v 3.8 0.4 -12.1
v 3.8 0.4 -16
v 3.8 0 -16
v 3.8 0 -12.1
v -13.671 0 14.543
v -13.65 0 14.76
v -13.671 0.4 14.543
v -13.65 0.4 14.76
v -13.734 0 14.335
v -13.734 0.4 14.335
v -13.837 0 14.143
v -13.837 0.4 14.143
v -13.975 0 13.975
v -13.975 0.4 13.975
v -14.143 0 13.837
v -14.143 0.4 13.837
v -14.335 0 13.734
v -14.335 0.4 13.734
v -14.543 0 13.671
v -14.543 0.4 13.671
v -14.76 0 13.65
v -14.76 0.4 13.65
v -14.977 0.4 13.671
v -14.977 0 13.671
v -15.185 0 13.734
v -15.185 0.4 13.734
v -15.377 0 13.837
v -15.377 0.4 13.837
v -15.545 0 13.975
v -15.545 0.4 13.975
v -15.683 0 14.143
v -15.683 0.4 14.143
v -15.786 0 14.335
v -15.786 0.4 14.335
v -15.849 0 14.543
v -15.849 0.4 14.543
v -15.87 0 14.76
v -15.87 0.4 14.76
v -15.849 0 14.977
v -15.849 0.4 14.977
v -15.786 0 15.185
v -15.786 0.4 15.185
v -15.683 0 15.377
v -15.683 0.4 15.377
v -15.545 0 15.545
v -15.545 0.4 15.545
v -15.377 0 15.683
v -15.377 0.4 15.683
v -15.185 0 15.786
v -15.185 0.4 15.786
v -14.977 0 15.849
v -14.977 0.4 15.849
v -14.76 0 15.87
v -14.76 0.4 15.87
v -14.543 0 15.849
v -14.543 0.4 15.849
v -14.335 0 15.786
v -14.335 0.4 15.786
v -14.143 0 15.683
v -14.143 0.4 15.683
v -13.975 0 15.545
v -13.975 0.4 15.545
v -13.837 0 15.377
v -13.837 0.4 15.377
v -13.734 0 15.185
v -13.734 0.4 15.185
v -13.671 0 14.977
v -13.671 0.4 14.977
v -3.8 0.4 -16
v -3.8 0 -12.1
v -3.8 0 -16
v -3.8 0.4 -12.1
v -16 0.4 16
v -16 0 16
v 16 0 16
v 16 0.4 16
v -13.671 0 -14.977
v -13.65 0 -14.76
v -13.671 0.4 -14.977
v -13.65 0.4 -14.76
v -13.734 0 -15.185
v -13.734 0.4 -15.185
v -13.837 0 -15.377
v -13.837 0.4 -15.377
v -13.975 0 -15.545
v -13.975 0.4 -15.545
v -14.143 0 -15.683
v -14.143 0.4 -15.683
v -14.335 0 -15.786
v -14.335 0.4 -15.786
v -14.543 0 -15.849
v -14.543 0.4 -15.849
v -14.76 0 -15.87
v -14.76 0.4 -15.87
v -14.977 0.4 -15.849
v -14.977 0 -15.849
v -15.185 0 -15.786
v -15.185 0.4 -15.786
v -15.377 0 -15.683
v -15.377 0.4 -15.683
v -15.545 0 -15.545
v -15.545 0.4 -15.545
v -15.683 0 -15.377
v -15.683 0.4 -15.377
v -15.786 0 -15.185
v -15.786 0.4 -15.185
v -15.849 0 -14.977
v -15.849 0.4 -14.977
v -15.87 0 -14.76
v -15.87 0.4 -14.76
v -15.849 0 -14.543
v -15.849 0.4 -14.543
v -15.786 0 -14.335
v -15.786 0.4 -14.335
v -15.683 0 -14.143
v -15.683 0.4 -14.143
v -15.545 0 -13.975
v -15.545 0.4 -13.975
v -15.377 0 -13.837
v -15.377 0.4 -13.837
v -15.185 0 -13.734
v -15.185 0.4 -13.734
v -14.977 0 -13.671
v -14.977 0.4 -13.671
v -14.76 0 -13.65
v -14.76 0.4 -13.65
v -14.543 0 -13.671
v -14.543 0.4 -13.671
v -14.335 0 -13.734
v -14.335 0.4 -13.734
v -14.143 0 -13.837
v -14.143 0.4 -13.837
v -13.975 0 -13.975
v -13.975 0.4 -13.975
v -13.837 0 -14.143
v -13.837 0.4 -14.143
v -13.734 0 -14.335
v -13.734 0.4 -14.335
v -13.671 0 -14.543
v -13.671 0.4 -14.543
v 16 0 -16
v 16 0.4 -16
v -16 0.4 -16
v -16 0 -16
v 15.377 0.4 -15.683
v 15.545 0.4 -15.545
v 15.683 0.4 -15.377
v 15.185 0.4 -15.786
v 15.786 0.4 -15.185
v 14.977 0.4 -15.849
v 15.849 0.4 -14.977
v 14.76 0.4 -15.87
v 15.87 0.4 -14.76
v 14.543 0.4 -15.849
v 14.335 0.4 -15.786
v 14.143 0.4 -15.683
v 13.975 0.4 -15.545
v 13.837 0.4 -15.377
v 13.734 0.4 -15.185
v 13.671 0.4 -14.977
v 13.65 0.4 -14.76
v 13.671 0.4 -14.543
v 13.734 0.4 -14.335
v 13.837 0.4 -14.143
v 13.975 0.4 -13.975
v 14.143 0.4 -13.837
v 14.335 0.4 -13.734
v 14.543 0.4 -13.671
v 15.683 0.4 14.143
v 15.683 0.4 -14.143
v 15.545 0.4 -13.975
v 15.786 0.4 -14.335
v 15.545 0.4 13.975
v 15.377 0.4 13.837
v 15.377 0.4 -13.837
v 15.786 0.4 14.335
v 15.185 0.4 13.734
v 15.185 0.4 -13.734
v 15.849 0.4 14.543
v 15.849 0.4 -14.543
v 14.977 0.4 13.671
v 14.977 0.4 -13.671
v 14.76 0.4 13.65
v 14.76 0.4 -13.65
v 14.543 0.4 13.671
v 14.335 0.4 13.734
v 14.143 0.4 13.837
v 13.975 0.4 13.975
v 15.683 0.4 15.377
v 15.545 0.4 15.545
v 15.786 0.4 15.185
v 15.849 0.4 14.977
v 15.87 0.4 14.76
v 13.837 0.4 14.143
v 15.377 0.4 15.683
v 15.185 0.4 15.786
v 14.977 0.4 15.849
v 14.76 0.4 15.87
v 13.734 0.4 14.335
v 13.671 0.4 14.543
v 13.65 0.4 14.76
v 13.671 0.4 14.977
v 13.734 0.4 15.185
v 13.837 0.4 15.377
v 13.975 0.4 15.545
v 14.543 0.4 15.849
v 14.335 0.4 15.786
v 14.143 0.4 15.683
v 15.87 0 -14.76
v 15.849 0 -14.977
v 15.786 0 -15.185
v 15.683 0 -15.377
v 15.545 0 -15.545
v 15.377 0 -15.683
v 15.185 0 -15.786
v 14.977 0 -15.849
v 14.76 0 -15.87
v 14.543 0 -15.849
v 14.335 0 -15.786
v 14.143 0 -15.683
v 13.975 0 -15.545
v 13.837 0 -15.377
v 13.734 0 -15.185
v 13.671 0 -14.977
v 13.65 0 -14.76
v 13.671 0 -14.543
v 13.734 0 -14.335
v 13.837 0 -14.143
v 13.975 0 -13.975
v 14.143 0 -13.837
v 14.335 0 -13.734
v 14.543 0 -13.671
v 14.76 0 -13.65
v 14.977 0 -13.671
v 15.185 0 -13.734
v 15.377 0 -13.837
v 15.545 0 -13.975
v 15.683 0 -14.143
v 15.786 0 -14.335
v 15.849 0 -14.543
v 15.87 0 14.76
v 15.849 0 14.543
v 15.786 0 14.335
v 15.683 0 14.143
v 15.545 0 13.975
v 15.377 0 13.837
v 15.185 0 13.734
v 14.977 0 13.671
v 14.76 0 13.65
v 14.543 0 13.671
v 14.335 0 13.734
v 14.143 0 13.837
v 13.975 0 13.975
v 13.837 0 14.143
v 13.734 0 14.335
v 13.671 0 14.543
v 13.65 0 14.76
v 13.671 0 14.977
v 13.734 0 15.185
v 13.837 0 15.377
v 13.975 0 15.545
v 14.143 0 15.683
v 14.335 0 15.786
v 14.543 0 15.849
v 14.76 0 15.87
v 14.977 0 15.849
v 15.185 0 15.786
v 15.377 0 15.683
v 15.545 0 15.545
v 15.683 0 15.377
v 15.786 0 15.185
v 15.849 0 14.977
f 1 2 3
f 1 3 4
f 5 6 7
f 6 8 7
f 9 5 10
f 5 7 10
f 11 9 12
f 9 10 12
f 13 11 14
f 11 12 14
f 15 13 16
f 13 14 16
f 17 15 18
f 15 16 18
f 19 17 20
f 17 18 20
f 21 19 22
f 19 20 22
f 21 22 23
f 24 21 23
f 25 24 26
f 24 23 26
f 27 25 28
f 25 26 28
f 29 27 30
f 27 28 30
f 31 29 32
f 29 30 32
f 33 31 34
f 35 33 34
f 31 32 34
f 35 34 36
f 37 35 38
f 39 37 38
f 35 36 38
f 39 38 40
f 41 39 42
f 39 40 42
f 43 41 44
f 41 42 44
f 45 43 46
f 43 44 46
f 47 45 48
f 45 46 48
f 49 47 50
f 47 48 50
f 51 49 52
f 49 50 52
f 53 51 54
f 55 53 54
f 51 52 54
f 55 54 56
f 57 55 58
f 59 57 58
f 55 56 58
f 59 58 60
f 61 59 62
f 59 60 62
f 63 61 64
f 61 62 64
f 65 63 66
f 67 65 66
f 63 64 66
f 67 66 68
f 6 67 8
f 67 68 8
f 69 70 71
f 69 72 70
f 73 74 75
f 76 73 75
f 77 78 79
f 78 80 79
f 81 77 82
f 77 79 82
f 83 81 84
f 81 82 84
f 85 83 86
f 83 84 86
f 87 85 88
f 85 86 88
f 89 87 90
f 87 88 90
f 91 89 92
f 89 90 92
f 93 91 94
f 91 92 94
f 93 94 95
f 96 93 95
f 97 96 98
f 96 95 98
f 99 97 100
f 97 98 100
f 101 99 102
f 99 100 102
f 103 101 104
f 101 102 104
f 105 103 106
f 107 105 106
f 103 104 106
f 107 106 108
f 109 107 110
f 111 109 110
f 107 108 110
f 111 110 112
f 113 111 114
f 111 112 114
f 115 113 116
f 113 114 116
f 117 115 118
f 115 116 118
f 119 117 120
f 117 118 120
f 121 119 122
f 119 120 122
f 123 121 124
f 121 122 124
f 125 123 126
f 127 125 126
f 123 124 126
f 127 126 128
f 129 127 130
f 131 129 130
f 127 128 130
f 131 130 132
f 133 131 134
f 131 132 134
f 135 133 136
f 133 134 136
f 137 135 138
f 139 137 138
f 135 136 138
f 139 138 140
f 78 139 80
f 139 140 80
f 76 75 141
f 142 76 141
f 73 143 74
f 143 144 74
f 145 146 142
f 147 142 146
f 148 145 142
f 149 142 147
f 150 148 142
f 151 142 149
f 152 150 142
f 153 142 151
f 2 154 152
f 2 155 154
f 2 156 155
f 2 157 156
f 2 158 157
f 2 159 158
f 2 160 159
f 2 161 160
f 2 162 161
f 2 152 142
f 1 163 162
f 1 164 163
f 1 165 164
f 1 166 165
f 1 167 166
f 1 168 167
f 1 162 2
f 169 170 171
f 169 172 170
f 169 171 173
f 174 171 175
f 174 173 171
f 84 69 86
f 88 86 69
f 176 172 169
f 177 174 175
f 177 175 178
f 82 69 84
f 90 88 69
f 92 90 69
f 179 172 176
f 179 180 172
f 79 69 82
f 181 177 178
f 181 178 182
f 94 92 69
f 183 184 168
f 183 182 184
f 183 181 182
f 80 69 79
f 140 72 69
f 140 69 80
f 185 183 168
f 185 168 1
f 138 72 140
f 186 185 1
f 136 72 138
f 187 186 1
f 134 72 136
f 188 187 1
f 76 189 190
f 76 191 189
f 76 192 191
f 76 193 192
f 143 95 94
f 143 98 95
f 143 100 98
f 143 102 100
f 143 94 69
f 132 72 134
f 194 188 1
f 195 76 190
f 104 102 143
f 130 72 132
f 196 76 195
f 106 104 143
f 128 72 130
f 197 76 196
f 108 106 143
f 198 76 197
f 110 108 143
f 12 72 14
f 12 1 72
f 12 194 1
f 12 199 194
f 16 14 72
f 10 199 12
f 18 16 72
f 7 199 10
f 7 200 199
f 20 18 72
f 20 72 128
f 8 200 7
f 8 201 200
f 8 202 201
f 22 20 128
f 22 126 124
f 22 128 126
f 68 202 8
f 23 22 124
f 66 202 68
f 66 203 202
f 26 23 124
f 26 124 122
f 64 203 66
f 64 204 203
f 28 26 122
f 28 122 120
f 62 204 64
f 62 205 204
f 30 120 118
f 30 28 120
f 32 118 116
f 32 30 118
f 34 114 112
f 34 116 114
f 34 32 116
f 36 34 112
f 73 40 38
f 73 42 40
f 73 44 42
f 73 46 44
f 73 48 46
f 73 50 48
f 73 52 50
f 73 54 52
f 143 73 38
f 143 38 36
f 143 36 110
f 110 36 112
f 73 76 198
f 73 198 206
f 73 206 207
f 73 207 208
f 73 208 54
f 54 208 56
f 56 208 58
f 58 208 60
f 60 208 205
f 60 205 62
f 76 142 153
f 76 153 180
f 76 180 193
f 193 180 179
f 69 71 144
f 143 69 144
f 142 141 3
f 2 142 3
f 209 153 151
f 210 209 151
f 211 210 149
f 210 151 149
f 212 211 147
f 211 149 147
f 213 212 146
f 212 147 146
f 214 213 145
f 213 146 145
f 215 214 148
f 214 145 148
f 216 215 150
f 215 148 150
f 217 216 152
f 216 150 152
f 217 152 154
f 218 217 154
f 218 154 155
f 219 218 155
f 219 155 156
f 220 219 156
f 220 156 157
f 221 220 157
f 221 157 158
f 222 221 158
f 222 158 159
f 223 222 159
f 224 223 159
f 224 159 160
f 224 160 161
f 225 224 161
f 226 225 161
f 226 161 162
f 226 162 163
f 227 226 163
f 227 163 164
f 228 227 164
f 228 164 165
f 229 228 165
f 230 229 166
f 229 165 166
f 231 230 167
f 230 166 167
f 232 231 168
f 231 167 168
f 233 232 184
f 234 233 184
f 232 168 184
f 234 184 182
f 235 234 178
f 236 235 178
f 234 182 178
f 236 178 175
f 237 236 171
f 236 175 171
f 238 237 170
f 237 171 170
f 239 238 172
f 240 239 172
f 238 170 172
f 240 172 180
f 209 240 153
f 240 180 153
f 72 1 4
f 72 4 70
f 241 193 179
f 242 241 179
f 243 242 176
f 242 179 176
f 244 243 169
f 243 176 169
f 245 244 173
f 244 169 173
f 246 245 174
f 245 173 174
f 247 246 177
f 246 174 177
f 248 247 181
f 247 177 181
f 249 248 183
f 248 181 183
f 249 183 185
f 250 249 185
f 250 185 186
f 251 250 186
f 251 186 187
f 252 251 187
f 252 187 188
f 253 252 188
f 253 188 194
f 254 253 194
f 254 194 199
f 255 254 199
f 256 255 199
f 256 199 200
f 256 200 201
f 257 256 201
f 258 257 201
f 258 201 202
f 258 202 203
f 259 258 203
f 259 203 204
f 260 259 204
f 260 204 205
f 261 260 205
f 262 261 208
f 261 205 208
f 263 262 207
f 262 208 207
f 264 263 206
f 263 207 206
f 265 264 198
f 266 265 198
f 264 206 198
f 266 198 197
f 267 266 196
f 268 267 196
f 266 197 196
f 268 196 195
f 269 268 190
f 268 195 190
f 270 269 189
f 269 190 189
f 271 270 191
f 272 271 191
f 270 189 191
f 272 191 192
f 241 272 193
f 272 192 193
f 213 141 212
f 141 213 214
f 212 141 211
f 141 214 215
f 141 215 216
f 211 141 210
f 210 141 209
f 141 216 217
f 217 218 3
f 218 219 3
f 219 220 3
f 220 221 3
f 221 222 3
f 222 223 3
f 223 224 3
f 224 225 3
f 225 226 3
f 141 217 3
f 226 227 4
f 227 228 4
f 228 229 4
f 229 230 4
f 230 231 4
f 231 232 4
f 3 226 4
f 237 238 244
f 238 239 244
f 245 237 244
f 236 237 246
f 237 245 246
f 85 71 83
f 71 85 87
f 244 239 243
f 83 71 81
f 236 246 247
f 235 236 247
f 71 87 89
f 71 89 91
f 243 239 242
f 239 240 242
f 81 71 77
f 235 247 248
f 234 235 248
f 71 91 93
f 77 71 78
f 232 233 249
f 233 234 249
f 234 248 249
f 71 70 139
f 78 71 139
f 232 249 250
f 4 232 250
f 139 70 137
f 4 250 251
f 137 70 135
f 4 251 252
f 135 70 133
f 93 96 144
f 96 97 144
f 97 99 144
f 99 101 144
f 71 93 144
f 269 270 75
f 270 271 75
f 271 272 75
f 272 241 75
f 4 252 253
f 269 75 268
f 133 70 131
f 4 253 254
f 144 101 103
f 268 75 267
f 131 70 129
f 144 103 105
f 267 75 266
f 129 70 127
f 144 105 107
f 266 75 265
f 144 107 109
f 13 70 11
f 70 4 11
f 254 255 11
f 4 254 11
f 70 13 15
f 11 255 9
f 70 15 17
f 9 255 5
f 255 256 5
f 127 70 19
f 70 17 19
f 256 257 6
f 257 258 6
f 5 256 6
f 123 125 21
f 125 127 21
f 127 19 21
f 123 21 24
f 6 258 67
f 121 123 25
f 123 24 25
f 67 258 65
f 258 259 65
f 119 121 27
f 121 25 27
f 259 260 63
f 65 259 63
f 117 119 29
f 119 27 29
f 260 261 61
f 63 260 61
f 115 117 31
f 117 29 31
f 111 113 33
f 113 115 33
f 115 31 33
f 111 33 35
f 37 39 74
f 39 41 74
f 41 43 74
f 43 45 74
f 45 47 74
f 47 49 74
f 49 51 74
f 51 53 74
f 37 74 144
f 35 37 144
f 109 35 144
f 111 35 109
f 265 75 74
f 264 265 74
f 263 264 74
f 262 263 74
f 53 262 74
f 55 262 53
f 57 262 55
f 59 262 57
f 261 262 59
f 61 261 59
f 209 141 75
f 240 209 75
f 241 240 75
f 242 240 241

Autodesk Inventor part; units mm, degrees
ref_plane "YZ Plane" through (0, 0, 0) normal (1, 0, 0) x (0, 1, 0)
ref_plane "XZ Plane" through (0, 0, 0) normal (0, 1, 0) x (-1, 0, 0)
ref_plane "XY Plane" through (0, 0, 0) normal (0, 0, 1) x (1, 0, 0)
sketch "Sketch1" plane through (0, 0, 0) normal (0, 1, 0) x (-1, 0, 0)
  line L0 (16, 16) -> (-16, 16)
  line L1 (-16, 16) -> (-16, -16)
  line L2 (-16, -16) -> (16, -16)
  line L3 (16, -16) -> (16, 16)
  line L4 (16, 16) -> (-16, -16) construction
  line L5 (-16, 16) -> (16, -16) construction
  point P0 (0, 0)
  dimension "d0" = 32
  dimension "d1" = 32
extrude "Extrusion1" add sketch "Sketch1" along normal blind 0.4
sketch "Sketch2" plane through (0, 0.4, 0) normal (0, 1, 0) x (1, 0, 0)
  circle A0 centre (-14.76, -14.76) radius 1.11
  circle A1 centre (-14.76, 14.76) radius 1.11
  circle A2 centre (14.76, 14.76) radius 1.11
  circle A3 centre (14.76, -14.76) radius 1.11
  line L0 (16, 16) -> (-16, 16) projected
  line L1 (-16, 16) -> (-16, -16) projected
  line L2 (16, -16) -> (16, 16) projected
  line L3 (-16, -16) -> (16, -16) projected
  point P0 (0, 0)
  dimension "d16" = 2.22
  dimension "d17" = 2.22
  dimension "d18" = 2.22
  dimension "d19" = 2.22
  dimension "d20" = 1.24
  dimension "d21" = 1.24
  dimension "d22" = 1.24
  dimension "d23" = 1.24
  dimension "d24" = 1.24
  dimension "d25" = 1.24
  dimension "d26" = 1.24
  dimension "d27" = 1.24
extrude "Extrusion2" cut sketch "Sketch2" against normal blind 0.4 contours A0 | A1 | A2 | A3
sketch "Sketch3" plane through (0, 0.4, 0) normal (0, 1, 0) x (1, 0, 0)
  line L0 (-3.8, 16) -> (3.8, 16)
  line L1 (3.8, 16) -> (3.8, 12.1)
  line L2 (3.8, 12.1) -> (-3.8, 12.1)
  line L3 (-3.8, 12.1) -> (-3.8, 16)
  line L4 (16, 16) -> (-16, 16) projected
  line L5 (16, -16) -> (16, 16) projected
  dimension "d32" = 7.6
  dimension "d33" = 3.9
  dimension "d34" = 0
  dimension "d35" = 12.2
extrude "Extrusion3" cut sketch "Sketch3" against normal blind 0.4
properties part number "Bottom Cover"
